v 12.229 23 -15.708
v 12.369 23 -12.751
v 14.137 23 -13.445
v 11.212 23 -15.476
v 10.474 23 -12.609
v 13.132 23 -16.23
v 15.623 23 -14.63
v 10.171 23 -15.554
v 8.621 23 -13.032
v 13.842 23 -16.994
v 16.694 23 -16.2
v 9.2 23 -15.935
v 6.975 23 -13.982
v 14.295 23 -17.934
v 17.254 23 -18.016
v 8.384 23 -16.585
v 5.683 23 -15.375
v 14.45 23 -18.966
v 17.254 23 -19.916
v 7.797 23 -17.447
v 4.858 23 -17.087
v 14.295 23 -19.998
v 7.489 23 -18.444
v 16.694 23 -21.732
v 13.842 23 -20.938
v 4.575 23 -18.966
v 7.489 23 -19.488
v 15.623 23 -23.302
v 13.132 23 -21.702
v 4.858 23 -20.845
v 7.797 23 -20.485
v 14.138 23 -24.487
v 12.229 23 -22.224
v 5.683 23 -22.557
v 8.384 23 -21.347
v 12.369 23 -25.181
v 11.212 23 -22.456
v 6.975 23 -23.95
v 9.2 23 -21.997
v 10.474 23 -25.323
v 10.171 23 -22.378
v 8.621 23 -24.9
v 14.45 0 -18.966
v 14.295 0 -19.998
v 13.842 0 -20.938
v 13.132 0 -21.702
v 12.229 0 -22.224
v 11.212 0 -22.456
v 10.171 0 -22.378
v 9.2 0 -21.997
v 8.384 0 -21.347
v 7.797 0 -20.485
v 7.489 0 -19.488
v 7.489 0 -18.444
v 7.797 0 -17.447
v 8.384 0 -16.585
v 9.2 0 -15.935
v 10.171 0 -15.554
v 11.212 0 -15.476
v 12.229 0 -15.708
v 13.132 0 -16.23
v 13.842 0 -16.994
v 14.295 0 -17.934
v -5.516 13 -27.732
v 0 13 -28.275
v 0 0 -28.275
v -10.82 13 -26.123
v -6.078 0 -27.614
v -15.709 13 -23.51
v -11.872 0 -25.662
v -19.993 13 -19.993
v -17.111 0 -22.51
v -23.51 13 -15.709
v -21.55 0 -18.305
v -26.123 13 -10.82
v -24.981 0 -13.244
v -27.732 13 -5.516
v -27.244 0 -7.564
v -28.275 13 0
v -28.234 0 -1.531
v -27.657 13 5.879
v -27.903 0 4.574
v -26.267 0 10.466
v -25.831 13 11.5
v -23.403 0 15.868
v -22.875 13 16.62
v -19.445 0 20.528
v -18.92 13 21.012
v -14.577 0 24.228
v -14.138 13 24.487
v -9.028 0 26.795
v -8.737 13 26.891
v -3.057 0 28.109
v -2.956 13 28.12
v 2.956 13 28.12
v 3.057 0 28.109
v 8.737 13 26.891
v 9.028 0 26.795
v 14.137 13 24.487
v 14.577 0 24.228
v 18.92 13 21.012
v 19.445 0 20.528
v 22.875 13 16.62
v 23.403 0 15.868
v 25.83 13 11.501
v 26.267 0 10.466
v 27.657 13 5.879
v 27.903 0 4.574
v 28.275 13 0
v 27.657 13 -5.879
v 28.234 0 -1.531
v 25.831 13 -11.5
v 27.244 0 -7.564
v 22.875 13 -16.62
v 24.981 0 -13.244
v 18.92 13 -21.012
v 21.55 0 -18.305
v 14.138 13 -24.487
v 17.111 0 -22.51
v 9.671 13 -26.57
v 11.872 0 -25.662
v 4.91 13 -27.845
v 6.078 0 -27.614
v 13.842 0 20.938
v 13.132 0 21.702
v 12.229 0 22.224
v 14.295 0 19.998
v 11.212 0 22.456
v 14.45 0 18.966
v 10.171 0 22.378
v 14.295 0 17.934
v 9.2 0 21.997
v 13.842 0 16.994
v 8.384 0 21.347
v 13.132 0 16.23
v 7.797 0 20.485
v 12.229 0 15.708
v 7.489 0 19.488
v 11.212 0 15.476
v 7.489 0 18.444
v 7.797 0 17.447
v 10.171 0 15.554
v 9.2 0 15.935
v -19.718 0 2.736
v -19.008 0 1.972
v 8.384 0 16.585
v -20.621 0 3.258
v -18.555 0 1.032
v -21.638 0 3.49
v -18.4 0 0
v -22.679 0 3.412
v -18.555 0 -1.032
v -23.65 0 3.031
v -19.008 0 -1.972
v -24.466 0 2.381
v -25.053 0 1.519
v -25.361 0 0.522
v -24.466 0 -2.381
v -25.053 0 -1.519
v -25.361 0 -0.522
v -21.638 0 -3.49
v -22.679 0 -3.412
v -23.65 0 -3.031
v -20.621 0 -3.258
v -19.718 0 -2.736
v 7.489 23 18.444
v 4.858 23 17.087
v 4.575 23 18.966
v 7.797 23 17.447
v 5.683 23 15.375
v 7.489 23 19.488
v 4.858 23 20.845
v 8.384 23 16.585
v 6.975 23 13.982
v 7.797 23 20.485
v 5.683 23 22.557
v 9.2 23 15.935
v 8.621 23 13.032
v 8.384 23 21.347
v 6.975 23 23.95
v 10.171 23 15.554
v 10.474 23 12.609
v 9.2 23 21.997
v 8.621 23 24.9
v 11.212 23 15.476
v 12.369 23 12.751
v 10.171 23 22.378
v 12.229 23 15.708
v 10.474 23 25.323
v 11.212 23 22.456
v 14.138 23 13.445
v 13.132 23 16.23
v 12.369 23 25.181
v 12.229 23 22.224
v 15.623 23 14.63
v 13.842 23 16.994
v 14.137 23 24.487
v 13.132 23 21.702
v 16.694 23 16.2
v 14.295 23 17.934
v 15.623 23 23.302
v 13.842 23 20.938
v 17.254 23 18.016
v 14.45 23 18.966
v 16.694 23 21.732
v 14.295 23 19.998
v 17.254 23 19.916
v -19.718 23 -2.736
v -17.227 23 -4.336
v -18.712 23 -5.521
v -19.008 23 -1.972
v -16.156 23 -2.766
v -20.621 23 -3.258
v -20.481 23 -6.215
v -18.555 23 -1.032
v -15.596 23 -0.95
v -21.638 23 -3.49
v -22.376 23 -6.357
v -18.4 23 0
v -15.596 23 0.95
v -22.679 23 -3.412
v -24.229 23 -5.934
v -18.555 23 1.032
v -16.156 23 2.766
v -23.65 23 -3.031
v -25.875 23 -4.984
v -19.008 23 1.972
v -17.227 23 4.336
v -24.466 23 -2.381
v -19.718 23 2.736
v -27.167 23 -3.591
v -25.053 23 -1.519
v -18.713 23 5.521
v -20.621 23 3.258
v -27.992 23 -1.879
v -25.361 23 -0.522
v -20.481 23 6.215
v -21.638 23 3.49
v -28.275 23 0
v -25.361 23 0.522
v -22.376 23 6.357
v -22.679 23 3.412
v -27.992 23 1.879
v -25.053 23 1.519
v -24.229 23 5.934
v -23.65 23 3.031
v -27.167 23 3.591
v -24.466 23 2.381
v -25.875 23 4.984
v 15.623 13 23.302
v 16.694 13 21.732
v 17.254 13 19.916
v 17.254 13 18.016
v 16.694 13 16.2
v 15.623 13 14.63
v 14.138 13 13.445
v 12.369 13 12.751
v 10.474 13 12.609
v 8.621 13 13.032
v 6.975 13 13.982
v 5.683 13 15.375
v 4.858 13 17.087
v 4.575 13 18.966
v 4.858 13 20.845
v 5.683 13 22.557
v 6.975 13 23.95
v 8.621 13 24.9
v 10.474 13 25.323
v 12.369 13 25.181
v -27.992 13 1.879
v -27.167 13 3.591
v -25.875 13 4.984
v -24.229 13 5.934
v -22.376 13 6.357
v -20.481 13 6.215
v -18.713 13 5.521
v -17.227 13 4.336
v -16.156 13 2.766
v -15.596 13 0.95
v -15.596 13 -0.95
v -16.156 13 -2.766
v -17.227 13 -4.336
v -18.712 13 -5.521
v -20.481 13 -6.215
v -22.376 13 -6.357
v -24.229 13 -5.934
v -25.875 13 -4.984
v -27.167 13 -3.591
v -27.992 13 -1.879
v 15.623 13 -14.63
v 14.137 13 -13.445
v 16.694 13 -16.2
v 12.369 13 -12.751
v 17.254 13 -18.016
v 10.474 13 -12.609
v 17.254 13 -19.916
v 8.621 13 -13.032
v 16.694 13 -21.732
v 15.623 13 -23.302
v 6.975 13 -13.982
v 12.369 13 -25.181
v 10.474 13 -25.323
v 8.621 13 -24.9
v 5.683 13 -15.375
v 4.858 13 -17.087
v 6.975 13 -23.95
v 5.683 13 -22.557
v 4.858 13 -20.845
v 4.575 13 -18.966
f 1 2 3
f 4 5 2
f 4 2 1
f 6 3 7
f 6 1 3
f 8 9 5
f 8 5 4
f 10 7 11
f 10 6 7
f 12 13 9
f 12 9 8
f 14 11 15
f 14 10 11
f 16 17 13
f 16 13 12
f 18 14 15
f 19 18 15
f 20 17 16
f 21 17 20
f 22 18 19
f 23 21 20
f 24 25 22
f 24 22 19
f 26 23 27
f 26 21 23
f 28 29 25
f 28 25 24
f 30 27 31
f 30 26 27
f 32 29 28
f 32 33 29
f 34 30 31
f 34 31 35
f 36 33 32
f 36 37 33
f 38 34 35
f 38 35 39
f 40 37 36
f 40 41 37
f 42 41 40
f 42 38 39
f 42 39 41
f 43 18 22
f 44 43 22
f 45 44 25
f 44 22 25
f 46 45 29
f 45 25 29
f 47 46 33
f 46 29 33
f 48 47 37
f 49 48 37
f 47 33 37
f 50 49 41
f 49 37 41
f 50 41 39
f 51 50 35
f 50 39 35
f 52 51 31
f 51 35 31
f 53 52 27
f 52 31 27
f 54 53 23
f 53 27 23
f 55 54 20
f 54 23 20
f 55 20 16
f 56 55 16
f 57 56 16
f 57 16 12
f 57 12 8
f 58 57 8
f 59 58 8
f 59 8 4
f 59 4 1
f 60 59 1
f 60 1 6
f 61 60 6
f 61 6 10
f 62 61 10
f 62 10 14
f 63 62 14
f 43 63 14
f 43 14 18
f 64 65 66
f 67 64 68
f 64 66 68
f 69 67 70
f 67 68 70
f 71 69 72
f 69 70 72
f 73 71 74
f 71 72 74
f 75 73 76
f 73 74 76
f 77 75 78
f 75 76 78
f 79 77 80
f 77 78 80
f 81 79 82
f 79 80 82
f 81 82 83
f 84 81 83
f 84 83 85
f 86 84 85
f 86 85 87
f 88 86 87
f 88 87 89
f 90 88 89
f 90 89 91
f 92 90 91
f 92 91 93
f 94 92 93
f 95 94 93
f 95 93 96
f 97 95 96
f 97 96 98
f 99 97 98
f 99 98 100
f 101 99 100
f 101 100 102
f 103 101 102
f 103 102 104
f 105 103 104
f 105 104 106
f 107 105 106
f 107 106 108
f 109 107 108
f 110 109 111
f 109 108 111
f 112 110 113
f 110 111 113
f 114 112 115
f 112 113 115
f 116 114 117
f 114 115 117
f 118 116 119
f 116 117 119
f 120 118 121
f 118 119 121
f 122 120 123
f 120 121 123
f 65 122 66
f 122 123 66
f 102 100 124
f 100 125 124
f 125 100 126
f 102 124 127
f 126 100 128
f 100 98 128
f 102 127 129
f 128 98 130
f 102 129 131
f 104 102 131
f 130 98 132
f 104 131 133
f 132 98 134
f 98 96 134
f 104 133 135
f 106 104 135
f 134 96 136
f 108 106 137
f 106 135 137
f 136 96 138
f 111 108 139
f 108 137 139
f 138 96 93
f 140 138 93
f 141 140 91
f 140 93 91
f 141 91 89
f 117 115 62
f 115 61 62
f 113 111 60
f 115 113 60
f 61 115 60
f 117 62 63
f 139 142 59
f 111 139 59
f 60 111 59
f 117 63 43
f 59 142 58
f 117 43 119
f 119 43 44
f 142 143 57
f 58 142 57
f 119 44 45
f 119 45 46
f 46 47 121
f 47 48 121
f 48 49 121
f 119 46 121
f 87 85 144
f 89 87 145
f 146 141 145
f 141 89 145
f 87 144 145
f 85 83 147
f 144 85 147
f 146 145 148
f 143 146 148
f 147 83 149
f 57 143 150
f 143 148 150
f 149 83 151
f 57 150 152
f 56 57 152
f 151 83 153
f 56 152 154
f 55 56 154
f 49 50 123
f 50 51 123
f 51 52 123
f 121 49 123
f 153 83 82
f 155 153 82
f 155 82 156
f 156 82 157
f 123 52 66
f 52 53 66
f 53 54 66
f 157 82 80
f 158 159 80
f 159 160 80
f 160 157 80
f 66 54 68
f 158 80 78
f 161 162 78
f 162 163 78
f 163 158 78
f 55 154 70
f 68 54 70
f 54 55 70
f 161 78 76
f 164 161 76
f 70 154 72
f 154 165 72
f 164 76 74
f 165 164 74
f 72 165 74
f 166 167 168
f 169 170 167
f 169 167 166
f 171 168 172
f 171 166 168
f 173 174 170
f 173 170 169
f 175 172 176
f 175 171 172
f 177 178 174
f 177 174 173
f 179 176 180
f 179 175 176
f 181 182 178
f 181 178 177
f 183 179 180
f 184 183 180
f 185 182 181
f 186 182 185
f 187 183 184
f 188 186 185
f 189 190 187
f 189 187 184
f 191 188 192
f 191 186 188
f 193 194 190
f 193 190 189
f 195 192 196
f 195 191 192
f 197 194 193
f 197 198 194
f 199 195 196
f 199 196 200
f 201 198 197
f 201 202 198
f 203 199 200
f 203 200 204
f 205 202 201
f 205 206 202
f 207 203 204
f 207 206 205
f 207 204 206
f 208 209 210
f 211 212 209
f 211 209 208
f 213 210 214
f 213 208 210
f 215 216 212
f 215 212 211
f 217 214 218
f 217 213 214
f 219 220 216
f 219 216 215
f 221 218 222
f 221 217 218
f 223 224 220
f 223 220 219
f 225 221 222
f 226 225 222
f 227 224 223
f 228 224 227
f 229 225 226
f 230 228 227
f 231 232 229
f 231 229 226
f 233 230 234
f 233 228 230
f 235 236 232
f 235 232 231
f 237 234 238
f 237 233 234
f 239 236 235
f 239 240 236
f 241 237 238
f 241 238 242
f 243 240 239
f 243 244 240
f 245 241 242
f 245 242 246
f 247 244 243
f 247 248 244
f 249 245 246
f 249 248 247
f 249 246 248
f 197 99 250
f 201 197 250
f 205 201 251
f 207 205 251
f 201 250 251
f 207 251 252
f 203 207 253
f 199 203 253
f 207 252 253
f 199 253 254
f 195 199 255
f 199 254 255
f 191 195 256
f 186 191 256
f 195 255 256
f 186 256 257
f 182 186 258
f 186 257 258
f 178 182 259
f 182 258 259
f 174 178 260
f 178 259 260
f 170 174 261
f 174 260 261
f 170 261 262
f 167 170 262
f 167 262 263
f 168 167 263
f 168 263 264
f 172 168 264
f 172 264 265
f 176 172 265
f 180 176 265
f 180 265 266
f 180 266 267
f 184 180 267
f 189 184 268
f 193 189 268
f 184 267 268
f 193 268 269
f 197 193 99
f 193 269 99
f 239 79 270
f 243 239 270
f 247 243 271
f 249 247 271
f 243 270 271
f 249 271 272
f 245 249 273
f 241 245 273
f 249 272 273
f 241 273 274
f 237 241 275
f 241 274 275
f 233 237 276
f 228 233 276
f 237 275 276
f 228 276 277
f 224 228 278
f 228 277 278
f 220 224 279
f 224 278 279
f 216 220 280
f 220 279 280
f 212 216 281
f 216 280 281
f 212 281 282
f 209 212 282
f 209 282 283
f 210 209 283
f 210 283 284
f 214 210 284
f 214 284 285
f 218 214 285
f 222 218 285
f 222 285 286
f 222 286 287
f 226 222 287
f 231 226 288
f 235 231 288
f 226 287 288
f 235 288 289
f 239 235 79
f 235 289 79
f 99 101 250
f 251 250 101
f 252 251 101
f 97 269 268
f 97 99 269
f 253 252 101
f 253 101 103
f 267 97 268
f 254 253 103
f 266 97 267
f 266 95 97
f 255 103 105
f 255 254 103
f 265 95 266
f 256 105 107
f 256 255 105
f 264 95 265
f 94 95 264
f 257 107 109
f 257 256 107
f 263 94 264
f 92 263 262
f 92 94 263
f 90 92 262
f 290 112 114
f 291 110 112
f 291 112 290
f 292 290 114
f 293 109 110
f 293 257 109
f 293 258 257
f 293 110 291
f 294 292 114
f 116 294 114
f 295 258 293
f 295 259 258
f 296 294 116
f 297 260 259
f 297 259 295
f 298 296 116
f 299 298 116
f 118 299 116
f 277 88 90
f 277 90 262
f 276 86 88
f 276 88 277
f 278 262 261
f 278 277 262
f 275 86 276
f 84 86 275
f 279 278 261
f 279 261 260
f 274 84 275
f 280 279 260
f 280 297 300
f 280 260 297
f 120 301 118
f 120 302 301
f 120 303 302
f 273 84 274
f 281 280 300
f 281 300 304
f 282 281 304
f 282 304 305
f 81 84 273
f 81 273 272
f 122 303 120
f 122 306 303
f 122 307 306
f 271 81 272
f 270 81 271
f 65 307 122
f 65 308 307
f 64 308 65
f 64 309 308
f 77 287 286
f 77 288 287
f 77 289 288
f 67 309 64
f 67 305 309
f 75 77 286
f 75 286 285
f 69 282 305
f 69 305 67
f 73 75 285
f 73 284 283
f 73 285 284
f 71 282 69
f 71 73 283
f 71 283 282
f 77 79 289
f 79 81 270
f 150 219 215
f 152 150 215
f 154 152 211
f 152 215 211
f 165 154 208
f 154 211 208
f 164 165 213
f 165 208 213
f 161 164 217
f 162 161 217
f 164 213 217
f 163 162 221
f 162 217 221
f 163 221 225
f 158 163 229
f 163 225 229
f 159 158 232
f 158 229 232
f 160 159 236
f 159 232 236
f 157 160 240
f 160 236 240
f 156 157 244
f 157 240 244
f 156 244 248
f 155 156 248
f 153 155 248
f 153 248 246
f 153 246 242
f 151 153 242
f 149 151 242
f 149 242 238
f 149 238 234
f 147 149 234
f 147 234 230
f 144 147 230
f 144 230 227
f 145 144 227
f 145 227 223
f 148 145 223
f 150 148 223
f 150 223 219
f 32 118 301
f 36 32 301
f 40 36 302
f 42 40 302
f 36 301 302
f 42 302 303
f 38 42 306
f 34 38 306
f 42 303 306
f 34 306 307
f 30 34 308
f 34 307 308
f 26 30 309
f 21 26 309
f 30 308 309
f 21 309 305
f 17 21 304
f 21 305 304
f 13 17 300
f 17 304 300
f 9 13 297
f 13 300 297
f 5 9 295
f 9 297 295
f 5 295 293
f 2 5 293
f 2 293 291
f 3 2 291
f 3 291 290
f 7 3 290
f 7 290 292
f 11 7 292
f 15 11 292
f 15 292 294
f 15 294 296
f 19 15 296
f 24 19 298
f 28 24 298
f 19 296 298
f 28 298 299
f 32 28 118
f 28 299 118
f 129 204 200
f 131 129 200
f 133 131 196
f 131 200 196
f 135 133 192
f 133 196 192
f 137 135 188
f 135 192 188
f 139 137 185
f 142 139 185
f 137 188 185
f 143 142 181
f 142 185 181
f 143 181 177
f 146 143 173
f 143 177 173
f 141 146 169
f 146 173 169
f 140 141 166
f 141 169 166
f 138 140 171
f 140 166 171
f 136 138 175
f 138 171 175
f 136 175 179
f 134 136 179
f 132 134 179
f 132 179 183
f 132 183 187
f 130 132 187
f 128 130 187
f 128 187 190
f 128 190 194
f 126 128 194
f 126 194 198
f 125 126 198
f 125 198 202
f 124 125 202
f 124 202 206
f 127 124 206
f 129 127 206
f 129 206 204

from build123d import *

# Parameters (mm, degrees)
SKETCH3_R           = 28.275
BOSS_EXTRUDE1_DEPTH = 13
SKETCH4_R           = 6.375
BOSS_EXTRUDE2_DEPTH = 10
D_GAGEMENT_M1_61_D  = 7


with BuildPart() as part:
    # Sketch3 → Boss-Extrude1 (new body)
    with BuildSketch(Plane(origin=(0, 0, 0), x_dir=(1, 0, 0), z_dir=(0, 1, 0))):
        with Locations(Location((0, 0, 0), (0, 0, 90))):
            Circle(SKETCH3_R)
    extrude(amount=BOSS_EXTRUDE1_DEPTH)

    # Sketch4 → Boss-Extrude2 (add)
    with BuildSketch(Plane(origin=(0, 13, 0), x_dir=(1, 0, 0), z_dir=(0, 1, 0))):
        with Locations(Location((-21.9, 0, 0), (0, 0, 179.999635348))):
            Circle(SKETCH4_R)
        with Locations(Location((10.95, 18.965956343, 0), (0, 0, 59.999635366))):
            Circle(SKETCH4_R)
        with Locations(Location((10.95, -18.965956343, 0), (0, 0, 299.999635366))):
            Circle(SKETCH4_R)
    extrude(amount=BOSS_EXTRUDE2_DEPTH)

    # Dégagement M1.61 (through all)
    with Locations(Plane(origin=(0, 0, 0), x_dir=(-1, 0, 0), z_dir=(0, -1, 0))):
        with Locations((21.9, 0), (-10.95, 18.965956343), (-10.95, -18.965956343)):
            Hole(D_GAGEMENT_M1_61_D / 2)


solid = part.part
